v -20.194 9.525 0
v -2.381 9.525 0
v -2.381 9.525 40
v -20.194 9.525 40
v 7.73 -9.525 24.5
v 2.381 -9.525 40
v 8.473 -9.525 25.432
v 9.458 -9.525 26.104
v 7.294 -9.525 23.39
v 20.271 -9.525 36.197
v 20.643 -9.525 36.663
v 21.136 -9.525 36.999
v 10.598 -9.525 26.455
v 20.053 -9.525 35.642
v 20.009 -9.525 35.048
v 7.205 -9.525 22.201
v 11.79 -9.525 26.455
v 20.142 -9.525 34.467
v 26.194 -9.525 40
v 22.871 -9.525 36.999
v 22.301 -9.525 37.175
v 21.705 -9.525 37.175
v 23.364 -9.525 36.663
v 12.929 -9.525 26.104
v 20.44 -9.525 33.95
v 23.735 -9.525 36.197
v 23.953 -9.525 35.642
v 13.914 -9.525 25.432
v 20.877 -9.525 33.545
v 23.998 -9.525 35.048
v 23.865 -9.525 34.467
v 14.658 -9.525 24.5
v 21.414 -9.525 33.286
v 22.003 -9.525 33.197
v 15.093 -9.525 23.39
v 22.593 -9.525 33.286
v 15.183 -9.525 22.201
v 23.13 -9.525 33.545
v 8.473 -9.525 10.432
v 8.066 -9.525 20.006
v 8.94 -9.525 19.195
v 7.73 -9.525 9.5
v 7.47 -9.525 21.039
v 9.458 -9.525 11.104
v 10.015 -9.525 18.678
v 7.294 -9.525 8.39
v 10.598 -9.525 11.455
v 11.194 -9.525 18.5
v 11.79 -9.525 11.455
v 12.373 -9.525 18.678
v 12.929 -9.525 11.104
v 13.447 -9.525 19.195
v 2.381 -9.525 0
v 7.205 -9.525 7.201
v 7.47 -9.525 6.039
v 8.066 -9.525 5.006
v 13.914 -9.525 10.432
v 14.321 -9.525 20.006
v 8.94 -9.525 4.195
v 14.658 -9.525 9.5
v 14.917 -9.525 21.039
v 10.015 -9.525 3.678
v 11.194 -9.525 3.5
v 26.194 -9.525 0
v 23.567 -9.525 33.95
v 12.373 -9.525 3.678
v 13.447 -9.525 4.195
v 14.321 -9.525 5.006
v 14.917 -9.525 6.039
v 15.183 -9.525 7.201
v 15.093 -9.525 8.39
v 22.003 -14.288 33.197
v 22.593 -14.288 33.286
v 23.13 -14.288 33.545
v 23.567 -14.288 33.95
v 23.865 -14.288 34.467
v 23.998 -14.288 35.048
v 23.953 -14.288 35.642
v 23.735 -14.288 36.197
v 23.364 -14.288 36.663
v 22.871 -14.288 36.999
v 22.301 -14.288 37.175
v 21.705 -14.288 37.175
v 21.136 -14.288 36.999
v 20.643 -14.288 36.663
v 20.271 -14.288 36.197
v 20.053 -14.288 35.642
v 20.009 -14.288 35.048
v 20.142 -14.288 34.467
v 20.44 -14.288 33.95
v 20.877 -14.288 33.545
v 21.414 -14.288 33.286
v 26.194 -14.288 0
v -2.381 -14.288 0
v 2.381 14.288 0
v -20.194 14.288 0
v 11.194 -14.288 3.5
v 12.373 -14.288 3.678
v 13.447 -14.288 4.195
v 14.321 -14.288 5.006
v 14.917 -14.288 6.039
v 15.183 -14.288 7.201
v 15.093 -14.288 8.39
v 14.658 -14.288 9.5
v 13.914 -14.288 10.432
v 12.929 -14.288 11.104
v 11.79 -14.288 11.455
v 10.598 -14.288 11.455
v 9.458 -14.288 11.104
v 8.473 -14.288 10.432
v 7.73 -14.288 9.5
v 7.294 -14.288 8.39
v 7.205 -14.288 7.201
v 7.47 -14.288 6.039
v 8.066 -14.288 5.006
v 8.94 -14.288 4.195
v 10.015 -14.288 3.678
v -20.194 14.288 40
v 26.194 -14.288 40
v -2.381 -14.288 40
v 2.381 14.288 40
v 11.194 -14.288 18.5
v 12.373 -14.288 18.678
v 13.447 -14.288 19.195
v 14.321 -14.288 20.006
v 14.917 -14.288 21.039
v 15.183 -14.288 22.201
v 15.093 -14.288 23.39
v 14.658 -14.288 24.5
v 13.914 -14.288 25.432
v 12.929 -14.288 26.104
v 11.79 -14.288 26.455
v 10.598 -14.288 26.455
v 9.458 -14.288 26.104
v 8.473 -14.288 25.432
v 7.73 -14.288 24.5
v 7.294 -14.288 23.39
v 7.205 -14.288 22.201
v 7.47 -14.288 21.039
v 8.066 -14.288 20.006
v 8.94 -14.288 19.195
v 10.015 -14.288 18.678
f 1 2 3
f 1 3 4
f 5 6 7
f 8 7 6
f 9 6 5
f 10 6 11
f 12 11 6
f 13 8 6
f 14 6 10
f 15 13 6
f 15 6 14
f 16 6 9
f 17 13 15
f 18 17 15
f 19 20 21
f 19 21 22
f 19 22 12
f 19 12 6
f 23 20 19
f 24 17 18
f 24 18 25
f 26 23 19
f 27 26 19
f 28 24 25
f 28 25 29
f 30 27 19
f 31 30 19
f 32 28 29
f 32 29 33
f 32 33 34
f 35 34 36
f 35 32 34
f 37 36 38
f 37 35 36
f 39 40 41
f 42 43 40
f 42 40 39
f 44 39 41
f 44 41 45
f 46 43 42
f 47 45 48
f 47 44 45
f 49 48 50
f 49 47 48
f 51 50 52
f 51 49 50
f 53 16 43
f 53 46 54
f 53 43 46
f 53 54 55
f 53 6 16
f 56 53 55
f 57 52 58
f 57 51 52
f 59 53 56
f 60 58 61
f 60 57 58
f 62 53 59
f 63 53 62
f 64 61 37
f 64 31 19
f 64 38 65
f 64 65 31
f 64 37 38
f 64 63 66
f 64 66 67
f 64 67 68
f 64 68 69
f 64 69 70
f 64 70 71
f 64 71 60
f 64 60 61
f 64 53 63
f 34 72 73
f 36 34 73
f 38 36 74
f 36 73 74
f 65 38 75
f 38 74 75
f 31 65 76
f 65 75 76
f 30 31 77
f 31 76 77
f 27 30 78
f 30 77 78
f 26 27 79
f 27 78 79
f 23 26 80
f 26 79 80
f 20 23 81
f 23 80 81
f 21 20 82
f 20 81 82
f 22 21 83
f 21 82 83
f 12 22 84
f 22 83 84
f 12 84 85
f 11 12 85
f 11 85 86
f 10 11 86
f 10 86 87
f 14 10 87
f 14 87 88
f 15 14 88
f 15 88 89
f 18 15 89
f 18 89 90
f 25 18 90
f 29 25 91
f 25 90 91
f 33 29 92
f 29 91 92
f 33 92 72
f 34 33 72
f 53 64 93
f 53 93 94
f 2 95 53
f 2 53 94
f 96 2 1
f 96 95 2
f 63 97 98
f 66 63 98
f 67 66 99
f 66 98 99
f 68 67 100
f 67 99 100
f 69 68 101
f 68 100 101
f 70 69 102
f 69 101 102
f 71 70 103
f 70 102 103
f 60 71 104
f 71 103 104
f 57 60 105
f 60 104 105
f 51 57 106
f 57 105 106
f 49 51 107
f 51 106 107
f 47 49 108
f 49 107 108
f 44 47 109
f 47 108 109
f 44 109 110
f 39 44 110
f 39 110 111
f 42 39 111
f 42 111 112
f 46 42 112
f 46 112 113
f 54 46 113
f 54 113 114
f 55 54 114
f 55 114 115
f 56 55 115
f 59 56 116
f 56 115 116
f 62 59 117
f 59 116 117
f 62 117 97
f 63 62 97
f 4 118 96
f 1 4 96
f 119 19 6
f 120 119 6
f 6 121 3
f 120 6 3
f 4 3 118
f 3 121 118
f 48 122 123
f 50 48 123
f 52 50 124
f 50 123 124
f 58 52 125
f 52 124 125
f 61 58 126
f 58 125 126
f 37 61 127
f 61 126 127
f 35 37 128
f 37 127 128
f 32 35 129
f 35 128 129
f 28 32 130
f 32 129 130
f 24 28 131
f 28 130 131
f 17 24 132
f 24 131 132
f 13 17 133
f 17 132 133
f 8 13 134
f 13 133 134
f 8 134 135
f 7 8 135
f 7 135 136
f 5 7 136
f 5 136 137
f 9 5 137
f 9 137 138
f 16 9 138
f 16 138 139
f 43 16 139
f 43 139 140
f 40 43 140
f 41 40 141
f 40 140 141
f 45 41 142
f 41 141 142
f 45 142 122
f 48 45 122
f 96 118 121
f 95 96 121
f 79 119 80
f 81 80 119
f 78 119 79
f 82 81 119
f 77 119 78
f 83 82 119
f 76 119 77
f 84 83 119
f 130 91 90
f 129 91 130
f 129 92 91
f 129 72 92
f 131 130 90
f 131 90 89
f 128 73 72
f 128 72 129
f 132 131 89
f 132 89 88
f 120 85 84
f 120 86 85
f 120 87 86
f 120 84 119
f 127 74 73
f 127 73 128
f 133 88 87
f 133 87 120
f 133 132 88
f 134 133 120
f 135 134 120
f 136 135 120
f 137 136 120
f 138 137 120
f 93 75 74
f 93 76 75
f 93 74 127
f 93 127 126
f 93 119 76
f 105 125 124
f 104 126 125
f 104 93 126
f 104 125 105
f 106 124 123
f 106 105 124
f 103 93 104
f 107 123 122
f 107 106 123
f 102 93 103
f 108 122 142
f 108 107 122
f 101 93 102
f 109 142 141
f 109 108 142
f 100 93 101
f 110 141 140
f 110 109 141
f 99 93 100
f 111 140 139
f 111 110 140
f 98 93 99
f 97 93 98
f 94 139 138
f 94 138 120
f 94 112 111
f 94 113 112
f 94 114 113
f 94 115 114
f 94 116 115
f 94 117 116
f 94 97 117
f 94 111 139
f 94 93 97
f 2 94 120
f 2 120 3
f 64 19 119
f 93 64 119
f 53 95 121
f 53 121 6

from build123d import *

# Parameters (mm, degrees)
BOSS_EXTRUDE1_DEPTH = 40
SKETCH4_W           = 6
SKETCH4_H           = 40
CUT_EXTRUDE1_DEPTH  = 4.7625
SKETCH5_R           = 4
SKETCH5_R_2         = 2
CUT_EXTRUDE2_DEPTH  = 4.7625


with BuildPart() as part:
    # Sketch3 → Boss-Extrude1 (new body)
    with BuildSketch(Plane.XY):
        Polygon((26.19375, -9.525), (26.19375, -14.2875), (-2.38125, -14.2875), (-2.38125, 9.525), (-26.19375, 9.525), (-26.19375, 14.2875), (2.38125, 14.2875), (2.38125, -9.525), align=None)
    extrude(amount=BOSS_EXTRUDE1_DEPTH)

    # Sketch4 → Cut-Extrude1 (cut)
    with BuildSketch(Plane(origin=(0, 14.2875, 0), x_dir=(1, 0, 0), z_dir=(0, 1, 0))):
        with Locations((-23.19375, -20)):
            Rectangle(SKETCH4_W, SKETCH4_H)
    extrude(amount=-CUT_EXTRUDE1_DEPTH, mode=Mode.SUBTRACT)

    # Sketch5 → Cut-Extrude2 (cut)
    with BuildSketch(Plane.XZ.offset(14.2875)):
        with Locations(Location((11.19375, 7.5, 0), (0, 0, 270))):
            Circle(SKETCH5_R)
        with Locations(Location((11.19375, 22.5, 0), (0, 0, 270))):
            Circle(SKETCH5_R)
        with Locations(Location((22.0033493, 35.1973816, 0), (0, 0, 270))):
            Circle(SKETCH5_R_2)
    extrude(amount=-CUT_EXTRUDE2_DEPTH, mode=Mode.SUBTRACT)


solid = part.part
